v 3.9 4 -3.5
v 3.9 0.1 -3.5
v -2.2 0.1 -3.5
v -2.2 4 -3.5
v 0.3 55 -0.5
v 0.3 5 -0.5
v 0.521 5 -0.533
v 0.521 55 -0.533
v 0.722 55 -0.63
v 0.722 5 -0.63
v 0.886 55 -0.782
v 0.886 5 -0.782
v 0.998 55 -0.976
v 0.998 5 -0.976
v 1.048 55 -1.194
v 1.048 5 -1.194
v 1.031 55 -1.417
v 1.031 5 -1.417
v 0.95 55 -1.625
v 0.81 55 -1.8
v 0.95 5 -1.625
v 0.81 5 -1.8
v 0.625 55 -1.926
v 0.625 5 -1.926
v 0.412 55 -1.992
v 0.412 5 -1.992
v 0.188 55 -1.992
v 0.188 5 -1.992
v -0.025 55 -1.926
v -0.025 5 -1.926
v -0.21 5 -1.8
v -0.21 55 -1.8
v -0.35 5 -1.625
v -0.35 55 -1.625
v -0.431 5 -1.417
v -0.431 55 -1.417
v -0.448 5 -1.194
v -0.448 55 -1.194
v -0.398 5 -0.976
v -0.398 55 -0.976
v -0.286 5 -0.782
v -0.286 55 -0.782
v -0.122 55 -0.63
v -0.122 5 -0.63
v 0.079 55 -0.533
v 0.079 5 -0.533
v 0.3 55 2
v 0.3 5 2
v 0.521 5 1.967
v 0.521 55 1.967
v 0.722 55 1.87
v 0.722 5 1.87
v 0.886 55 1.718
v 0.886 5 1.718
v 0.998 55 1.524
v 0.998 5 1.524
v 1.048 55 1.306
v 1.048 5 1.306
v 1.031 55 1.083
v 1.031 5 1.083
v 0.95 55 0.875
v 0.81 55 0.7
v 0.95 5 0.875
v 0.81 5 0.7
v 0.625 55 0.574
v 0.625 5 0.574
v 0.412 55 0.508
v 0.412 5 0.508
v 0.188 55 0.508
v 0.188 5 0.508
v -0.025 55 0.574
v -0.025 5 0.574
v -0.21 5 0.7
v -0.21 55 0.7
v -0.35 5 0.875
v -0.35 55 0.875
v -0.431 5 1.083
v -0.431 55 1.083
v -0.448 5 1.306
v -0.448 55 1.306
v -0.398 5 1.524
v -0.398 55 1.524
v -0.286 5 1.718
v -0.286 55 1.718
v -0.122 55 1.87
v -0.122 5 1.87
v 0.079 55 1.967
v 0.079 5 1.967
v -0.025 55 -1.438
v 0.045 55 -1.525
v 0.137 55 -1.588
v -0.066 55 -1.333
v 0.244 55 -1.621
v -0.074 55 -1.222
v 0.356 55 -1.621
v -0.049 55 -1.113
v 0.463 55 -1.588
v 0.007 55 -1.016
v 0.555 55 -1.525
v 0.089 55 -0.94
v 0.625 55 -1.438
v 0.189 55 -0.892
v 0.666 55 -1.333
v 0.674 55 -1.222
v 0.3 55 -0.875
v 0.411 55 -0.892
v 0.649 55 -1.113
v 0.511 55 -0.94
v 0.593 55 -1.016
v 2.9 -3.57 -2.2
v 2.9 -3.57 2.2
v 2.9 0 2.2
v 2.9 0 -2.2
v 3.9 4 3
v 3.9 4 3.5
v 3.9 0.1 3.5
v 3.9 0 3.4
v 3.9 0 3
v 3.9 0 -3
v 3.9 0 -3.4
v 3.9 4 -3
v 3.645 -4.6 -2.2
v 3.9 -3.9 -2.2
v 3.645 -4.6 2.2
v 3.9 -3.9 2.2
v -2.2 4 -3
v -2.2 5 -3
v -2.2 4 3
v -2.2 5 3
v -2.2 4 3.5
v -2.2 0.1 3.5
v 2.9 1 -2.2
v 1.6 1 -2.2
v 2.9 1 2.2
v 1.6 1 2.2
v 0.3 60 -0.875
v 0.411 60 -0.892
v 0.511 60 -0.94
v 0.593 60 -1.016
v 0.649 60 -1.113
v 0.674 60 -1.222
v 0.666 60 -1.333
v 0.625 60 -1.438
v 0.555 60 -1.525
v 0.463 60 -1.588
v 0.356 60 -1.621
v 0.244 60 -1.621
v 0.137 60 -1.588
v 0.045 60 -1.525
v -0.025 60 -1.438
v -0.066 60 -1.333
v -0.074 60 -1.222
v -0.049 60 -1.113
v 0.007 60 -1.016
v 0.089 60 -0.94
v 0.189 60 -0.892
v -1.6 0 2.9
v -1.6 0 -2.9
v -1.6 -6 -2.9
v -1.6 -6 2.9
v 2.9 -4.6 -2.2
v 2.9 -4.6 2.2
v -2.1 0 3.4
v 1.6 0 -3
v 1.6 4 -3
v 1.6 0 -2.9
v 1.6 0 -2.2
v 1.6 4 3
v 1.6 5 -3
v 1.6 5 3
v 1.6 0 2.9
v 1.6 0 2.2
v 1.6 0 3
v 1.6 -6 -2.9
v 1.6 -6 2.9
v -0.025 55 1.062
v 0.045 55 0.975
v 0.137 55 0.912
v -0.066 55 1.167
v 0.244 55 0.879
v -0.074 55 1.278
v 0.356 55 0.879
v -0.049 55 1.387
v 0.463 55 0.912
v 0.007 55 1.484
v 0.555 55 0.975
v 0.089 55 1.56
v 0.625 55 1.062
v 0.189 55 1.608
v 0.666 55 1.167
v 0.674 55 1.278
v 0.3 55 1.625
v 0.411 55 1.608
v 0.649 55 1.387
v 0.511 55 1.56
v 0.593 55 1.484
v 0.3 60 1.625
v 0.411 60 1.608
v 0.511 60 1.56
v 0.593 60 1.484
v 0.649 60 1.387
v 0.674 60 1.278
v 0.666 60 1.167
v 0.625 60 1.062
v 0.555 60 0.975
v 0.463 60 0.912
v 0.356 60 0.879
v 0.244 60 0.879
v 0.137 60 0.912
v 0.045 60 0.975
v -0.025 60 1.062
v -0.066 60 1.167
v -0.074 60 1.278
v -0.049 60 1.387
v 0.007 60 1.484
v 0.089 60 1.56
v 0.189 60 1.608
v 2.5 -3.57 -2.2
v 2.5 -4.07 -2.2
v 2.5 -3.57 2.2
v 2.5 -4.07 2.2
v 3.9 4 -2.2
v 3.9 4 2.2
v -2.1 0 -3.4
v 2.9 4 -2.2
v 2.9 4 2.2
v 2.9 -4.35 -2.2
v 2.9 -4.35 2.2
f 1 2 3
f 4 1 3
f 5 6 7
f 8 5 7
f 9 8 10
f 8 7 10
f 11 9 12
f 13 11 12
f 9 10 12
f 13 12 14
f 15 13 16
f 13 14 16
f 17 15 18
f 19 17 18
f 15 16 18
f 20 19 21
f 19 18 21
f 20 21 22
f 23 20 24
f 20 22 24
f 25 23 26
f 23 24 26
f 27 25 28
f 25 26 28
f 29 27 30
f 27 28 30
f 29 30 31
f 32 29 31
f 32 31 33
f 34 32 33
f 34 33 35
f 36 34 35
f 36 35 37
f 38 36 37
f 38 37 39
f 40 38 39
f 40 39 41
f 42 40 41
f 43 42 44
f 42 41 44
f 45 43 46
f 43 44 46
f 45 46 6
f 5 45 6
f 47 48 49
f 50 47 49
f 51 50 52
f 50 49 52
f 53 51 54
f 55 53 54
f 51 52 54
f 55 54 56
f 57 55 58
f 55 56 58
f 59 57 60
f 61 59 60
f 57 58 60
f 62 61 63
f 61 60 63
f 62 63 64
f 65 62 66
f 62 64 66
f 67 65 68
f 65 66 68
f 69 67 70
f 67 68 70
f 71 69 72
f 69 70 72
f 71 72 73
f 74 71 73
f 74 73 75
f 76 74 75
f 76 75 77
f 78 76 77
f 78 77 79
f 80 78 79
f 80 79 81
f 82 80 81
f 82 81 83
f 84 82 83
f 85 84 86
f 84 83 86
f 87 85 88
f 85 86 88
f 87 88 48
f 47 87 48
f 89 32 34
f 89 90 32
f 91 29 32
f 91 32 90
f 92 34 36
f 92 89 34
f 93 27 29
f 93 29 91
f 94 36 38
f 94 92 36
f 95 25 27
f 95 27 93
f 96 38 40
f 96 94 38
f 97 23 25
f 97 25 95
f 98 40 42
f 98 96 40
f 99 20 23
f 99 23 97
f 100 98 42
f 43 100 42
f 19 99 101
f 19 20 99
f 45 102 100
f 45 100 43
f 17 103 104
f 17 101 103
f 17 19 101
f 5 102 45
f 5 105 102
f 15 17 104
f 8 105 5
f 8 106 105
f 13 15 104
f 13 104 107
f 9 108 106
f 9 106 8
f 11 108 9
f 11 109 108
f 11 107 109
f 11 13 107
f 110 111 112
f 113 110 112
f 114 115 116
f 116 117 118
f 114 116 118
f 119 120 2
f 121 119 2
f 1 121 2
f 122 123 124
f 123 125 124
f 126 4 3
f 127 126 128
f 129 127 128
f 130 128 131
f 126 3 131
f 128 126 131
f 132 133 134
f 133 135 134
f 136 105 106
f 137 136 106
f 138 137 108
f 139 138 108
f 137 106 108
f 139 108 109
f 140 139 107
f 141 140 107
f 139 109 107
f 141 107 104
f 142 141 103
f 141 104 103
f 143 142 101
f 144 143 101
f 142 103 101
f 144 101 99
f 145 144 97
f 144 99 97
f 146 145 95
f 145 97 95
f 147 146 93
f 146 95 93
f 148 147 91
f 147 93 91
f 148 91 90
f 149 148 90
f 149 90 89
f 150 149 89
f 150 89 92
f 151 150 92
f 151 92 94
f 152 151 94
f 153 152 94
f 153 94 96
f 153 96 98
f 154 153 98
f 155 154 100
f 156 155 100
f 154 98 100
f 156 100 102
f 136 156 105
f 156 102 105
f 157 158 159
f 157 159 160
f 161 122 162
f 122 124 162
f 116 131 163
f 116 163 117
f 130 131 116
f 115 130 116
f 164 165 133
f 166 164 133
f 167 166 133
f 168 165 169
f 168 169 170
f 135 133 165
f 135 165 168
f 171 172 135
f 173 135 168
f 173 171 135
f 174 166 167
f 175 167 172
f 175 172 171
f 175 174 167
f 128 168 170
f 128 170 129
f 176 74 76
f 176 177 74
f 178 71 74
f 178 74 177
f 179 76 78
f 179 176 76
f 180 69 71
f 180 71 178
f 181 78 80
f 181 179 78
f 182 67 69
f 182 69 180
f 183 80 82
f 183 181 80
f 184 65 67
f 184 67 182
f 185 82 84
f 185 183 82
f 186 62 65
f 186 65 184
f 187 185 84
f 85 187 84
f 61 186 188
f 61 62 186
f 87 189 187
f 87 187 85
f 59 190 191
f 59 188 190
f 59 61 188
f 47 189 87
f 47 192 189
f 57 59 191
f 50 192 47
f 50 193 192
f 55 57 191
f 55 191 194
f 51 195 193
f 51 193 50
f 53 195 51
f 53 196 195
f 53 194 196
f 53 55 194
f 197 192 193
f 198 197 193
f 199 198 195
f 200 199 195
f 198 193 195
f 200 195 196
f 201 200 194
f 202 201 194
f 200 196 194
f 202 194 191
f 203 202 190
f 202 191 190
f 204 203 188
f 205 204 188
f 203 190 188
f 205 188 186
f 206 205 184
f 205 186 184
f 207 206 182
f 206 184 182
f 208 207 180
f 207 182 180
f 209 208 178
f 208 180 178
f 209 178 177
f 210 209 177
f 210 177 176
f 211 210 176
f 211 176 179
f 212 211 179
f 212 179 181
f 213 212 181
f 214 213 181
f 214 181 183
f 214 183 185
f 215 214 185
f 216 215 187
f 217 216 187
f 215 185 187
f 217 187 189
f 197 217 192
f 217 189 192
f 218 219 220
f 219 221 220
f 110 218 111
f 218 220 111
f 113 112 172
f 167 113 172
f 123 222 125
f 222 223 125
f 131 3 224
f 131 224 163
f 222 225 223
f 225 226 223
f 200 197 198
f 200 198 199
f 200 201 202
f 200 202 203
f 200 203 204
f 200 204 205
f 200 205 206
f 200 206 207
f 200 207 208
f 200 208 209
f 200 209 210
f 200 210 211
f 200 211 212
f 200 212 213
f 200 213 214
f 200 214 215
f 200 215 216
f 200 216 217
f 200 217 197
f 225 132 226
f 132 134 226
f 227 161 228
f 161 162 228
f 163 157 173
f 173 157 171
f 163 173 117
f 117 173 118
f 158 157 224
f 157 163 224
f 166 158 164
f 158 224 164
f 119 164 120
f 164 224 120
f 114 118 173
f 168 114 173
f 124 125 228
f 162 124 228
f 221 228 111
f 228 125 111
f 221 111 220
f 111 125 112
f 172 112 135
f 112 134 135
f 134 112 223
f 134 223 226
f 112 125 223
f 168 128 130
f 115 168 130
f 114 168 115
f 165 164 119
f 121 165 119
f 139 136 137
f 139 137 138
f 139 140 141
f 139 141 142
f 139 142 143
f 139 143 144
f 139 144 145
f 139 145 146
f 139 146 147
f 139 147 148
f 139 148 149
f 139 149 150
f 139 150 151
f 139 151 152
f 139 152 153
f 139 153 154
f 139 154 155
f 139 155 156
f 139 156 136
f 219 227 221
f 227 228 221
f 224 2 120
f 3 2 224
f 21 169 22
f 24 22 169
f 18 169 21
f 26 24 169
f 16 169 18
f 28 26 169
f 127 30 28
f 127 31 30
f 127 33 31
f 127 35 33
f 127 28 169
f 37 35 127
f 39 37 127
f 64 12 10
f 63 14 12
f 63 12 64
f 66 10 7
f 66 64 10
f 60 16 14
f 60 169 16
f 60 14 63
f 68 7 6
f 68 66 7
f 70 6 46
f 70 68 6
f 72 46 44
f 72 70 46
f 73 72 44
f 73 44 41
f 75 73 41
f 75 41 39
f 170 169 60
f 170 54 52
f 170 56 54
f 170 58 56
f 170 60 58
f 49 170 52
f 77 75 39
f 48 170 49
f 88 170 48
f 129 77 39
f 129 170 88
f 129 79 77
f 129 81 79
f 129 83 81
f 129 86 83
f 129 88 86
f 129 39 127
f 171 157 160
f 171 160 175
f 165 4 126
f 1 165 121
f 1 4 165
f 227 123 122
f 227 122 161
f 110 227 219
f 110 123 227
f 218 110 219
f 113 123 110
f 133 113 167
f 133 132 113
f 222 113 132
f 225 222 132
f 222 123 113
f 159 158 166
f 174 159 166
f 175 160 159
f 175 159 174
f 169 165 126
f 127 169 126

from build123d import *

# Parameters (mm, degrees)
BASE_EXTRUDE_DEPTH       = 4
SKETCH2_W                = 3.8
SKETCH2_H                = 6
BOSS_EXTRUDE1_DEPTH      = 1
SKETCH3_W                = 3.2
SKETCH3_H                = 5.8
BOSS_EXTRUDE2_DEPTH      = 6
BOSS_EXTRUDE3_DEPTH      = 2.2
WIRE_INSULATION_SKETCH_R = 0.75
WIRE_INSULATION_DEPTH    = 50
WIRE_SKETCH_R            = 0.375
WIRE_2_DEPTH             = 5
CHAMFER1_SIZE            = 0.1


with BuildPart() as part:
    # Sketch1 → Base-Extrude (new body)
    with BuildSketch(Plane(origin=(0, 0, 0), x_dir=(1, 0, 0), z_dir=(0, 1, 0))):
        Polygon((3.9, 3), (3.9, 3.5), (-2.2, 3.5), (-2.2, -3.5), (3.9, -3.5), (3.9, -3), (1.6, -3), (1.6, 3), align=None)
    extrude(amount=BASE_EXTRUDE_DEPTH)

    # Sketch2 → Boss-Extrude1 (add)
    with BuildSketch(Plane(origin=(0, 4, 0), x_dir=(-1, 0, 0), z_dir=(0, 1, 0))):
        with Locations((0.3, 0)):
            Rectangle(SKETCH2_W, SKETCH2_H)
    extrude(amount=BOSS_EXTRUDE1_DEPTH)

    # Sketch3 → Boss-Extrude2 (add)
    with BuildSketch(Plane.XZ):
        Rectangle(SKETCH3_W, SKETCH3_H)
    extrude(amount=BOSS_EXTRUDE2_DEPTH)

    # Sketch4 → Boss-Extrude3 (add, symmetric)
    with BuildSketch(Plane.XY):
        Polygon((1.6, 0), (1.6, 1), (2.9, 1), (2.9, 4), (3.9, 4), (3.9, -3.9), (3.645220836, -4.6), (2.9, -4.6), (2.9, -4.35), (2.5, -4.069916985), (2.5, -3.569916985), (2.9, -3.569916985), (2.9, 0), align=None)
    extrude(amount=BOSS_EXTRUDE3_DEPTH, both=True)

    # Wire Insulation Sketch → Wire Insulation (add)
    with BuildSketch(Plane(origin=(0, 5, 0), x_dir=(-1, 0, 0), z_dir=(0, 1, 0))):
        with Locations(Location((-0.3, 1.25, 0), (0, 0, 90))):
            Circle(WIRE_INSULATION_SKETCH_R)
        with Locations(Location((-0.3, -1.25, 0), (0, 0, 90))):
            Circle(WIRE_INSULATION_SKETCH_R)
    extrude(amount=WIRE_INSULATION_DEPTH)

    # Wire Sketch → Wire 2 (add)
    with BuildSketch(Plane(origin=(0, 55, 0), x_dir=(-1, 0, 0), z_dir=(0, 1, 0))):
        with Locations(Location((-0.3, -1.25, 0), (0, 0, 90))):
            Circle(WIRE_SKETCH_R)
        with Locations(Location((-0.3, 1.25, 0), (0, 0, 90))):
            Circle(WIRE_SKETCH_R)
    extrude(amount=WIRE_2_DEPTH)

    # Chamfer1
    chamfer1_edges = [part.edges().sort_by_distance(p)[0] for p in [
        (0.85, 0, 3.5),
        (-2.2, 0, 0),
        (0.85, 0, -3.5),
    ]]
    chamfer(chamfer1_edges, length=CHAMFER1_SIZE)


solid = part.part
